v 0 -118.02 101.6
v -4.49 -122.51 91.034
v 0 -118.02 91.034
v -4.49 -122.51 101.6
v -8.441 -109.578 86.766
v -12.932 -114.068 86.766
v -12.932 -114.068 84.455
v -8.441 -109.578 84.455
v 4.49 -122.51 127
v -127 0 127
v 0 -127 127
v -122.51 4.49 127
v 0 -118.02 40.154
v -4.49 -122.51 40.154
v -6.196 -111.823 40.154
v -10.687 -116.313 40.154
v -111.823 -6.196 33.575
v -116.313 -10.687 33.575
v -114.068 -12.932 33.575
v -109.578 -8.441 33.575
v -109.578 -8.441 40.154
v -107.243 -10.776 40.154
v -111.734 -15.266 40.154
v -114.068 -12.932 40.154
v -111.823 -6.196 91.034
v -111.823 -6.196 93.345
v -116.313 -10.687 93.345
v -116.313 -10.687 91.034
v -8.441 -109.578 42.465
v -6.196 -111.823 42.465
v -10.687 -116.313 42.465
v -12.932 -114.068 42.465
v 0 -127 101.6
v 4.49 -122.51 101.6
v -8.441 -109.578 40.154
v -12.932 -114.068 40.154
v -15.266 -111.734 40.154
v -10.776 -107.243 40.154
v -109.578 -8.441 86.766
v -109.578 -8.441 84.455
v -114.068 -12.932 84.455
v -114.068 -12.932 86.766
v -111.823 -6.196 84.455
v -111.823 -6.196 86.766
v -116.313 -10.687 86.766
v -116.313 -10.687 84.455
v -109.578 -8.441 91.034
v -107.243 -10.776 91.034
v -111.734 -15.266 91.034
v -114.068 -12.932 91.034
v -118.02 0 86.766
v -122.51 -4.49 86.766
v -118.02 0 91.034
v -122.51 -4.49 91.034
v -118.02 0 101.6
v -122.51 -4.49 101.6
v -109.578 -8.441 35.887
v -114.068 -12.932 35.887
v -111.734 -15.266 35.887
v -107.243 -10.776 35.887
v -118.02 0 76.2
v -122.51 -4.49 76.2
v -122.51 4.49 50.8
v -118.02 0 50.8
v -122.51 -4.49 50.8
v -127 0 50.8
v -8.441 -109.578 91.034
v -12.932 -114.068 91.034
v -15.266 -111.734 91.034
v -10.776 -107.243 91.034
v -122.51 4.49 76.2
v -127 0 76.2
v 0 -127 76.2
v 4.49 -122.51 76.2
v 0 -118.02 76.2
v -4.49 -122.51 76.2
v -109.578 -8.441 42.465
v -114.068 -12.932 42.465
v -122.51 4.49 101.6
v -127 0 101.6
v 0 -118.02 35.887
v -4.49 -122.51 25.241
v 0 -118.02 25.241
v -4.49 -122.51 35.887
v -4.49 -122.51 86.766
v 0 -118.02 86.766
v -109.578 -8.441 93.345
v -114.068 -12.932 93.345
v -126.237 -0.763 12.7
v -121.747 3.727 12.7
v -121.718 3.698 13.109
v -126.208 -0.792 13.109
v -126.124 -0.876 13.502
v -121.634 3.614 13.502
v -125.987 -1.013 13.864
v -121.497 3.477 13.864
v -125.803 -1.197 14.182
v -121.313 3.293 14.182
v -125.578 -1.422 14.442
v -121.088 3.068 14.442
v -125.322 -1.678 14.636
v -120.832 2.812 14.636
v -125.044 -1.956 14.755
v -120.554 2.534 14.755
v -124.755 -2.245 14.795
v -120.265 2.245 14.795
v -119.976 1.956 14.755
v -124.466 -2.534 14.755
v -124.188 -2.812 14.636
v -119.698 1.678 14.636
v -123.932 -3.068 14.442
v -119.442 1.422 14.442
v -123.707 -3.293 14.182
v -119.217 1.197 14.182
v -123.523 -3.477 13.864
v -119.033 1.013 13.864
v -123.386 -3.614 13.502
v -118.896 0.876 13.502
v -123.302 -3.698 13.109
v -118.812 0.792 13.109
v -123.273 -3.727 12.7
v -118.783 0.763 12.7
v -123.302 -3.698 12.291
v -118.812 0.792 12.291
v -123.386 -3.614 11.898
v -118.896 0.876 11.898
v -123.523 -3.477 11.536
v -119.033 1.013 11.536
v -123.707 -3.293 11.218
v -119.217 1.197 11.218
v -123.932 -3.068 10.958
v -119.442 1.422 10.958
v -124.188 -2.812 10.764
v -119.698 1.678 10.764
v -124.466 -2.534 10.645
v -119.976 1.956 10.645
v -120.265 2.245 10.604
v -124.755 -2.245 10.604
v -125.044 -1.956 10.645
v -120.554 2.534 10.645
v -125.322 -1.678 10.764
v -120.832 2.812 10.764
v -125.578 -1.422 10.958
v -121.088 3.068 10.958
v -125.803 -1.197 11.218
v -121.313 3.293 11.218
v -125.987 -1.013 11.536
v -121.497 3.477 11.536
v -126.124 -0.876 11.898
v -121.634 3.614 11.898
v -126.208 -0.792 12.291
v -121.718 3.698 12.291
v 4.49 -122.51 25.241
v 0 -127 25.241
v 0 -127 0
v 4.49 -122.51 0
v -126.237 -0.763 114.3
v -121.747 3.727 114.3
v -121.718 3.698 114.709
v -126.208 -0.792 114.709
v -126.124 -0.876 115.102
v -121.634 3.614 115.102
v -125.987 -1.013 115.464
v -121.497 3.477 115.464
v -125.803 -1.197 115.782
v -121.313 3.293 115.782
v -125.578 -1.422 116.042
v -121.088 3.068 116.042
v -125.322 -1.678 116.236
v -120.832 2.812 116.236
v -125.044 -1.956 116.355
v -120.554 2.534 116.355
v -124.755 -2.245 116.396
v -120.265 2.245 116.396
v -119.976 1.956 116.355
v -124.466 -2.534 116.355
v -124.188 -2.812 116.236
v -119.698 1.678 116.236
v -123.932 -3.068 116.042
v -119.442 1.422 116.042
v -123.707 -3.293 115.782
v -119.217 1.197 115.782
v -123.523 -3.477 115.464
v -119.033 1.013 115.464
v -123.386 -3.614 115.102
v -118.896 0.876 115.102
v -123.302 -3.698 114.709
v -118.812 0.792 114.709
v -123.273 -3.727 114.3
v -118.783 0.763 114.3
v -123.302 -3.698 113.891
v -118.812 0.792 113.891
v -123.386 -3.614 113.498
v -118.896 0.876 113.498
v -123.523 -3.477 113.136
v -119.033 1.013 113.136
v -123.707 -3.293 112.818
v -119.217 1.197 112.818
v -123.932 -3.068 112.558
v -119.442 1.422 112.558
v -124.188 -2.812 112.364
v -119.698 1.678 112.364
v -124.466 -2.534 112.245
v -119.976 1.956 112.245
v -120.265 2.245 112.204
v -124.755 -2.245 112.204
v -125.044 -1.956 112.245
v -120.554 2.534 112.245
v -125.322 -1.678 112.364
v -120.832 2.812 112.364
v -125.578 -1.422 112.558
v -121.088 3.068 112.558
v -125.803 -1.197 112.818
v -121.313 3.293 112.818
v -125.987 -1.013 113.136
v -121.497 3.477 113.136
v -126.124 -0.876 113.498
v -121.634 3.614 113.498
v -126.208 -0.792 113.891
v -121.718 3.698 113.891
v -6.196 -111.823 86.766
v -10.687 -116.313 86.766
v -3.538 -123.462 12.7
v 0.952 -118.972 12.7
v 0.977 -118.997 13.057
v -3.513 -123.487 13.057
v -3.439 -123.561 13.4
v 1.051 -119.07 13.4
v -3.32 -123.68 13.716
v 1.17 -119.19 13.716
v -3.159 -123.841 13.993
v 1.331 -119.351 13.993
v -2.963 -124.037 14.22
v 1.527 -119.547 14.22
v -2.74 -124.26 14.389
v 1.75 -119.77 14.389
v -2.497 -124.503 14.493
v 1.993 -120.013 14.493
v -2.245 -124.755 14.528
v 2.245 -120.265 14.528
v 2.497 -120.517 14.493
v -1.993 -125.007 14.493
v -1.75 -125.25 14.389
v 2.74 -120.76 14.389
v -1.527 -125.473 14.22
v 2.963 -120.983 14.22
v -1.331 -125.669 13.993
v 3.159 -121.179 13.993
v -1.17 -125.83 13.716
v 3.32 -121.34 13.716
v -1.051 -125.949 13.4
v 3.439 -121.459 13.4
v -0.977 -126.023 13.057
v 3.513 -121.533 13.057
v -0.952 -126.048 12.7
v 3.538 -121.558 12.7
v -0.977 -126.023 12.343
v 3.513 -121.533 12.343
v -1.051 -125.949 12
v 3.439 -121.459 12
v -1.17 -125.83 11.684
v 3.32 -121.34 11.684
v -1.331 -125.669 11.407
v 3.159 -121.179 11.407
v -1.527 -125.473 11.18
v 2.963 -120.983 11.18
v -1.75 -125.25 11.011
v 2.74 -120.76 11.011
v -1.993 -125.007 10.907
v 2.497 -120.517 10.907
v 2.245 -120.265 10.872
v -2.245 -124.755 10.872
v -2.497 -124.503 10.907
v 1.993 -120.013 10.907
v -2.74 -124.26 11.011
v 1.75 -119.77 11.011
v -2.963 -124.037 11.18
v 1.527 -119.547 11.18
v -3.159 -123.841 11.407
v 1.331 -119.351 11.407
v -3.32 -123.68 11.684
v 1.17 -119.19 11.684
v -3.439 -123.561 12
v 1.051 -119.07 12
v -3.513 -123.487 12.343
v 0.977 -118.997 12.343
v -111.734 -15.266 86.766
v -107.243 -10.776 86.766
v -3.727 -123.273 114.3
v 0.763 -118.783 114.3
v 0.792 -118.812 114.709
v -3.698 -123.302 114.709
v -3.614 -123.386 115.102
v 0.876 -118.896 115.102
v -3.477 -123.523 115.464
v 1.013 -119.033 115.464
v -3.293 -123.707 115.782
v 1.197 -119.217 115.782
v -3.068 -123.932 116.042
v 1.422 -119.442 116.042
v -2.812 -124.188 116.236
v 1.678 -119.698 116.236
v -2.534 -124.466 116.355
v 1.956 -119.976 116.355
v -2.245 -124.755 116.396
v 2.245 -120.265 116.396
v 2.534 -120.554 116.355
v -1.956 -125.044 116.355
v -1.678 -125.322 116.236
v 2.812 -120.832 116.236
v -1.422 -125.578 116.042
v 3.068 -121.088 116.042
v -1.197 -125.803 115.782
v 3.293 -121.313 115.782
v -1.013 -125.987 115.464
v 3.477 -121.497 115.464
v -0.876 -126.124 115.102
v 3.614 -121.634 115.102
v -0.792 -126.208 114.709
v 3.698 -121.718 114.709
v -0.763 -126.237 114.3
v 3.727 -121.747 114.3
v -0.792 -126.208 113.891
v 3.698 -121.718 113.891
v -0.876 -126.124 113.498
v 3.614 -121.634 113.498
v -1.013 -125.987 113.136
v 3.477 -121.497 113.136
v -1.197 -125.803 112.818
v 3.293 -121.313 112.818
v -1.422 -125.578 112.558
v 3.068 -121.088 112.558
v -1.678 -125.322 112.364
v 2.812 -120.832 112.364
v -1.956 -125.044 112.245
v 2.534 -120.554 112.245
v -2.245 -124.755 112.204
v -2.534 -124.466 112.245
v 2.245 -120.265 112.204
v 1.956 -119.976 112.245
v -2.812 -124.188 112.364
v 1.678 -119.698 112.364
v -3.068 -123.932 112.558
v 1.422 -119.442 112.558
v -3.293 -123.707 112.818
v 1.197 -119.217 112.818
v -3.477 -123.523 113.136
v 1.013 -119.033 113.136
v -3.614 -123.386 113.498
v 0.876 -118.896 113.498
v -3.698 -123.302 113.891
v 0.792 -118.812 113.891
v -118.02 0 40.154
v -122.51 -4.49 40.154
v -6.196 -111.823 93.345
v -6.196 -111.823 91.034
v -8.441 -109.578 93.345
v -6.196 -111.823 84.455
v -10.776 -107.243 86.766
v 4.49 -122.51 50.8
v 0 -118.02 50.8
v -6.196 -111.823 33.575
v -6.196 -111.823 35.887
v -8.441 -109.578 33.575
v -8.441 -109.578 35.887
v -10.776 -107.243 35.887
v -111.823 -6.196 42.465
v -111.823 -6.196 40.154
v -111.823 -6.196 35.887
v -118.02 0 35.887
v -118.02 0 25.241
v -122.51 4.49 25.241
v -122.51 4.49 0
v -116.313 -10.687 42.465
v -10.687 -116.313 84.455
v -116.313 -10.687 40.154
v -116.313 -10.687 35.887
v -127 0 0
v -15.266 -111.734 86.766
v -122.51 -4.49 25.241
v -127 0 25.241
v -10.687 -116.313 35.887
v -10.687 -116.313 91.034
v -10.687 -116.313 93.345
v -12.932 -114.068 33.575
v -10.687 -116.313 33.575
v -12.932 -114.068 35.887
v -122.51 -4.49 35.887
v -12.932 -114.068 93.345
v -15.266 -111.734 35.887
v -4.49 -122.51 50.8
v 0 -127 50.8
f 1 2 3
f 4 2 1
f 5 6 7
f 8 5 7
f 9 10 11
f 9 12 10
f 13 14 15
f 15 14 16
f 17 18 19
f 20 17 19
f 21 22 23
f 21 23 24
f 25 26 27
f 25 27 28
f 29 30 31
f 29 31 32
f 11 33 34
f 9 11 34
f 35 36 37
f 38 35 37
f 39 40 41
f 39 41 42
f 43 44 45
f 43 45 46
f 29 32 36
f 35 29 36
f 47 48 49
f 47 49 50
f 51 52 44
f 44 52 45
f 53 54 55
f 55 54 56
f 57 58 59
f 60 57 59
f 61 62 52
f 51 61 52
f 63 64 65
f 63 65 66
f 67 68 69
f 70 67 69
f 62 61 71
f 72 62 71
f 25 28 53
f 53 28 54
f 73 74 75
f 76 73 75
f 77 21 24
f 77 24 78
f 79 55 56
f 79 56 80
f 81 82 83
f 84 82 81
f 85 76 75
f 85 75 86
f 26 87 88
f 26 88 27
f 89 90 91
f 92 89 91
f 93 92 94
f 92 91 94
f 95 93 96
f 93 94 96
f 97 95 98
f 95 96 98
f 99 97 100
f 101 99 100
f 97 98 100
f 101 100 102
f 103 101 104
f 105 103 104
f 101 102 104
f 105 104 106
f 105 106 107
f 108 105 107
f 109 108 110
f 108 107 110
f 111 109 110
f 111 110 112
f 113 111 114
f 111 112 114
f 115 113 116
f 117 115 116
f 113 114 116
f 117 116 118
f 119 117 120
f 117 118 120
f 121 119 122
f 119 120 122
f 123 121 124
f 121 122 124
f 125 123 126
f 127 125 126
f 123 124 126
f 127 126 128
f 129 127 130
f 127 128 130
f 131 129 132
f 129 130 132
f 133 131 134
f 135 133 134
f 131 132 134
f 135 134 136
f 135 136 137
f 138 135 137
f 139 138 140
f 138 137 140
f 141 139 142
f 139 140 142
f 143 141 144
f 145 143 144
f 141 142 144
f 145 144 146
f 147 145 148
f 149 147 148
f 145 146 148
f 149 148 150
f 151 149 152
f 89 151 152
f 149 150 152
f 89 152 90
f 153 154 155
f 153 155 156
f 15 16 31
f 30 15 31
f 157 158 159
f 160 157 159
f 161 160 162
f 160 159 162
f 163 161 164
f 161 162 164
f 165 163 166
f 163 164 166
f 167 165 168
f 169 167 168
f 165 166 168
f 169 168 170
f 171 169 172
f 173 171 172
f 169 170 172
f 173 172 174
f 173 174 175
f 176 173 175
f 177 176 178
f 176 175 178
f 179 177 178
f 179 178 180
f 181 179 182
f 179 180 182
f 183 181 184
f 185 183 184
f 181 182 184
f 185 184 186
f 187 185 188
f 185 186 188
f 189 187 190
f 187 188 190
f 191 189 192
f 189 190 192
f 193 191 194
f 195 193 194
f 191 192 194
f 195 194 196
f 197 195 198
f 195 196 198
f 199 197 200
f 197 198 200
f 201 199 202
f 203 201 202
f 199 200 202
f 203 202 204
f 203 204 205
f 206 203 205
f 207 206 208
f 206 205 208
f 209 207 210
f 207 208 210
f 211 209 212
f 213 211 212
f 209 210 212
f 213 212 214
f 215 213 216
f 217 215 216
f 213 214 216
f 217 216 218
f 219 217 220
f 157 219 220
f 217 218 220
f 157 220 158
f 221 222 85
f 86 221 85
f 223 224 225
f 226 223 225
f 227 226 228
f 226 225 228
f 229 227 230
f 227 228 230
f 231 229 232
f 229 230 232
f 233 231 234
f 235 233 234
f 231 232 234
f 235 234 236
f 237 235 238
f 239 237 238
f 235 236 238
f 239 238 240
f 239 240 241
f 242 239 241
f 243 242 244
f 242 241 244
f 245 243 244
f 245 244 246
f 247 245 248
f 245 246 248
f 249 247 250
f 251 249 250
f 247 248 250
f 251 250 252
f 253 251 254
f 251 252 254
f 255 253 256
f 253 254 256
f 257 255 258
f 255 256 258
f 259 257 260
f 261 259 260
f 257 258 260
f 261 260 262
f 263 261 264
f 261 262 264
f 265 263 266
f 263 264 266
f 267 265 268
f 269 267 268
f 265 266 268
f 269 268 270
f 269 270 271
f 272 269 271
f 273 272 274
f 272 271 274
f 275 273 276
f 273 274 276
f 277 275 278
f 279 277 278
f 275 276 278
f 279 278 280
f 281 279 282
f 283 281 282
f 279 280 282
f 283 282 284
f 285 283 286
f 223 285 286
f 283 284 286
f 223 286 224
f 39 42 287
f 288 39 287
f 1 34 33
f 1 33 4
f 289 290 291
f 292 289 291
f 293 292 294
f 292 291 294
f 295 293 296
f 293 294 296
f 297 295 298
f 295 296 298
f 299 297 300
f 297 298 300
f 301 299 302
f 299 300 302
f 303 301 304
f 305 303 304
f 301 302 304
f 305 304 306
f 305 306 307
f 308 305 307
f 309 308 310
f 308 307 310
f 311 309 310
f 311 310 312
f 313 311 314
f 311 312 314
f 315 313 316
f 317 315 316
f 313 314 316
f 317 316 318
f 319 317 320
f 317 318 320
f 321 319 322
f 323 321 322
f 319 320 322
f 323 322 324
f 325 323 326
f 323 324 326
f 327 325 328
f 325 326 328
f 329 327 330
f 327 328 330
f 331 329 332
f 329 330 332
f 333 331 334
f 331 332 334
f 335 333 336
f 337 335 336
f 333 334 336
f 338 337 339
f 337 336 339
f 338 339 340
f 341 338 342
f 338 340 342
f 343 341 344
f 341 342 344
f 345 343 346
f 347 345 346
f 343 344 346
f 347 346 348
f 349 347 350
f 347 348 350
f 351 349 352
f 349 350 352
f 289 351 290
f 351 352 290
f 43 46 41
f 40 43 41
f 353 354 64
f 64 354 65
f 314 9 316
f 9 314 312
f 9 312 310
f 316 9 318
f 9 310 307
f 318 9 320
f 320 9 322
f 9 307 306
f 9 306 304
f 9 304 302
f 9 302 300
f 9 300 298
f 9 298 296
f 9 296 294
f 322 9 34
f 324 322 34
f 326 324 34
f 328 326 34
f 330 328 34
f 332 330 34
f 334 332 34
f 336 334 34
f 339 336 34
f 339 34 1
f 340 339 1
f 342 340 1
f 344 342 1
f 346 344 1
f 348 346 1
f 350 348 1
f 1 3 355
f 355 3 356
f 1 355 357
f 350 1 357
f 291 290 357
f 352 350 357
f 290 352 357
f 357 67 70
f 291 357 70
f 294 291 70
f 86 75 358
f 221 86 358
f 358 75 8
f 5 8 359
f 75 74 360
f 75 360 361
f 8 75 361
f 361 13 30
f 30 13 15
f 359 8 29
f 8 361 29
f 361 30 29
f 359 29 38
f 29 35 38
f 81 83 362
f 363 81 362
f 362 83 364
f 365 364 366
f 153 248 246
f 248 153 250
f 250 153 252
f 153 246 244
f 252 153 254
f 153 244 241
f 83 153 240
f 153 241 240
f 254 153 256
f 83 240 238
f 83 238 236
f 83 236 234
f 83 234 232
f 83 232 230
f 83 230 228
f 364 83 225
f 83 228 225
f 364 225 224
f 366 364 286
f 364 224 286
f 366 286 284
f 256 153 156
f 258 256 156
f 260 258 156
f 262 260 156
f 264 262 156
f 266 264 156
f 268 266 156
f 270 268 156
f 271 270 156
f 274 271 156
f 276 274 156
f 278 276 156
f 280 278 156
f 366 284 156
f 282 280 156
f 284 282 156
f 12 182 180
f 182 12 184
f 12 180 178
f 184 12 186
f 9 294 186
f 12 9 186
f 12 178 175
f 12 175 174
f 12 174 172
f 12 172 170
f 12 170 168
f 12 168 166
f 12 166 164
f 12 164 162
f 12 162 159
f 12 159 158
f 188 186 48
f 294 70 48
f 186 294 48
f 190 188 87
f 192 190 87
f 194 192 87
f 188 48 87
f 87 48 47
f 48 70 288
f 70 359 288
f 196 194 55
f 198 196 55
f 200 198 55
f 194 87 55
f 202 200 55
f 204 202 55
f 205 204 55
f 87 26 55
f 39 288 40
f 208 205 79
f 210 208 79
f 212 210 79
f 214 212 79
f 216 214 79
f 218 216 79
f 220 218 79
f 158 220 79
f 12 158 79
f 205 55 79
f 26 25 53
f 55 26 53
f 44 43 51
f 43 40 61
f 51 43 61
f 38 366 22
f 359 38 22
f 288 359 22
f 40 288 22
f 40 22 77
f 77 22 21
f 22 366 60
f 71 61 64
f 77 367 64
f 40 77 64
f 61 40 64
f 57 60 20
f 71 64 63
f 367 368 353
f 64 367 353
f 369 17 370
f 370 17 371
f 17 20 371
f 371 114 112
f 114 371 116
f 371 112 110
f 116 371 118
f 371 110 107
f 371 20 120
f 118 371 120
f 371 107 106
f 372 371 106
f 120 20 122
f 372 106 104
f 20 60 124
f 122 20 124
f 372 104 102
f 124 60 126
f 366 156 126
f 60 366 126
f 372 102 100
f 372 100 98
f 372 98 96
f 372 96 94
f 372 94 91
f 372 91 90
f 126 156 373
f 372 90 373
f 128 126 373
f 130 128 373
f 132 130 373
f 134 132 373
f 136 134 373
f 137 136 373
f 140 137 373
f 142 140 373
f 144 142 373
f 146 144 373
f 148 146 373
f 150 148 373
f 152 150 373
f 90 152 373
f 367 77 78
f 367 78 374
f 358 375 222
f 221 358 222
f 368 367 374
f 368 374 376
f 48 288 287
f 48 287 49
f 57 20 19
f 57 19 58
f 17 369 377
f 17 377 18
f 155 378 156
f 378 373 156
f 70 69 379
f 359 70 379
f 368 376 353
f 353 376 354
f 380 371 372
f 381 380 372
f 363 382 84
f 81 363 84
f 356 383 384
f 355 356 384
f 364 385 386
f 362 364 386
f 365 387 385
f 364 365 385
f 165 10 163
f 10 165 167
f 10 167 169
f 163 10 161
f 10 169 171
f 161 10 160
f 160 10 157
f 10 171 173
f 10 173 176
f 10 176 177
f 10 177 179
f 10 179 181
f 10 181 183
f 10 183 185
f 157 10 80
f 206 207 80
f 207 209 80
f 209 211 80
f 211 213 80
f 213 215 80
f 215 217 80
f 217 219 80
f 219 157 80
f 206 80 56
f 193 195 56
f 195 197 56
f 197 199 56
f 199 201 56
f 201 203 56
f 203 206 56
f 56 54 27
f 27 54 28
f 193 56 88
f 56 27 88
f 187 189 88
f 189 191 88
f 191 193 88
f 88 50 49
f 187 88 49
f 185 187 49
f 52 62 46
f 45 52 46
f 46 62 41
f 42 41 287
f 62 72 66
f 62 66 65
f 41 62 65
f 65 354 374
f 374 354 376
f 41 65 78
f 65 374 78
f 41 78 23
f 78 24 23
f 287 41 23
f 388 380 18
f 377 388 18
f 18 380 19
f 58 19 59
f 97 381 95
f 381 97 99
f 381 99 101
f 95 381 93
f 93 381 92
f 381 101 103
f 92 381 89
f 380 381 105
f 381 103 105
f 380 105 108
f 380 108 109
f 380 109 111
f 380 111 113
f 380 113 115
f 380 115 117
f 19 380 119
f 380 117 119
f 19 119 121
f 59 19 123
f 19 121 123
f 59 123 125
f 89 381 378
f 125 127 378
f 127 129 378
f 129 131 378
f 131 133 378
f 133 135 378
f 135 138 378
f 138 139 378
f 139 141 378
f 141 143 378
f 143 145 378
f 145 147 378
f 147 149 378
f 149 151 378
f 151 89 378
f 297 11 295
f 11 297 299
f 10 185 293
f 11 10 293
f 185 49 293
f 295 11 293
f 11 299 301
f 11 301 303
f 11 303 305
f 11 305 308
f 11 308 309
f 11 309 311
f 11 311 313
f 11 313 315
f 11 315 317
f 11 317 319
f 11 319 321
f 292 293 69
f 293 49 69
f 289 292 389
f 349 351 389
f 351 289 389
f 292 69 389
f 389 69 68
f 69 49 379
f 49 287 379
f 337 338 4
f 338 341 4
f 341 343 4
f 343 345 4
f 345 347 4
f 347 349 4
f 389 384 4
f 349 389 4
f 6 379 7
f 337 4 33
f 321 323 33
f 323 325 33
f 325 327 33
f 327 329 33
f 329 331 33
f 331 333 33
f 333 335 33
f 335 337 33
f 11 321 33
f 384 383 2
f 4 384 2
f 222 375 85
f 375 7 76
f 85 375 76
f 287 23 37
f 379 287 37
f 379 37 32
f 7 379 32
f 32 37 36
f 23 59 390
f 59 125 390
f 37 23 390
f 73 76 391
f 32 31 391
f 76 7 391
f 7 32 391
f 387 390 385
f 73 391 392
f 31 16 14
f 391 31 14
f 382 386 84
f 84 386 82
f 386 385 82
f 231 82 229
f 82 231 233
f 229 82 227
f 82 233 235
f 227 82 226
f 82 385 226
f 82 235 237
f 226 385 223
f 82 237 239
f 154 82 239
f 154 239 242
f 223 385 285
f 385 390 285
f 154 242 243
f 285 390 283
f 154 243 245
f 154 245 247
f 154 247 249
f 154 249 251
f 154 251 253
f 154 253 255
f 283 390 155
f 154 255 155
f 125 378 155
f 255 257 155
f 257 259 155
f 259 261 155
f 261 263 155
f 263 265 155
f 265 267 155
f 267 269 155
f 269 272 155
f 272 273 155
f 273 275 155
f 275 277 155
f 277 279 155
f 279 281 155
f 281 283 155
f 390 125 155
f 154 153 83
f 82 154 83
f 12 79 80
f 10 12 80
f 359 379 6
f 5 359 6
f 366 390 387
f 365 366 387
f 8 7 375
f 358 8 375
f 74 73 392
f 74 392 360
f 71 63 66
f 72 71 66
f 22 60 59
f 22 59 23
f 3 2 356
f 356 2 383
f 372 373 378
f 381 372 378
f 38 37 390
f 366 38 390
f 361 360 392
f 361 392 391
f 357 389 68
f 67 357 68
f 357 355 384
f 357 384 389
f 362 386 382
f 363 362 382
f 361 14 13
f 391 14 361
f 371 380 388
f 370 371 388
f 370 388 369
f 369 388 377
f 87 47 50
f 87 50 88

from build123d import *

# Parameters (mm, degrees)
BOSS_EXTRUDE1_DEPTH = 127
SKETCH2_W           = 25.4
SKETCH2_H           = 6.35
SKETCH2_W_2         = 25.559422118
CUT_EXTRUDE1_DEPTH  = 6.35
CUT_EXTRUDE2_DEPTH  = 6.35
SKETCH4_R           = 2.0955
SKETCH4_R_2         = 1.828321723
CUT_EXTRUDE3_DEPTH  = 6.35


with BuildPart() as part:
    # Sketch1 → Boss-Extrude1 (new body)
    with BuildSketch(Plane.XY):
        Polygon((-127, 0), (0, -127), (4.490128061, -122.509871939), (-122.509871939, 4.490128061), align=None)
    extrude(amount=BOSS_EXTRUDE1_DEPTH)

    # Sketch2 → Cut-Extrude1 (cut)
    with BuildSketch(Plane(origin=(-63.5, -63.5, 0), x_dir=(0, 0, 1), z_dir=(-0.7071067811865509, -0.7071067811865441, 0))):
        with Locations((88.9, 86.627561211)):
            Rectangle(SKETCH2_W, SKETCH2_H)
        with Locations((38.020288941, 86.627561211)):
            Rectangle(SKETCH2_W_2, SKETCH2_H)
        with Locations((88.9, -86.627561211)):
            Rectangle(SKETCH2_W, SKETCH2_H)
        with Locations((38.020288941, -86.627561211)):
            Rectangle(SKETCH2_W_2, SKETCH2_H)
    extrude(amount=-CUT_EXTRUDE1_DEPTH, mode=Mode.SUBTRACT)

    # Sketch3 → Cut-Extrude2 (cut)
    with BuildSketch(Plane(origin=(-63.5, -63.5, 0), x_dir=(0, 0, 1), z_dir=(-0.7071067811865509, -0.7071067811865441, 0))):
        Polygon((91.0336, 83.452561211), (86.7664, 83.452561211), (86.7664, 74.689561211), (84.455, 74.689561211), (84.455, 71.514561211), (86.7664, 71.514561211), (86.7664, 68.212561211), (91.0336, 68.212561211), (91.0336, 71.514561211), (93.345, 71.514561211), (93.345, 74.689561211), (91.0336, 74.689561211), align=None)
        Polygon((40.153888941, 83.452561211), (35.886688941, 83.452561211), (35.886688941, 74.689561211), (33.575288941, 74.689561211), (33.575288941, 71.514561211), (35.886688941, 71.514561211), (35.886688941, 68.212561211), (40.153888941, 68.212561211), (40.153888941, 71.514561211), (42.465288941, 71.514561211), (42.465288941, 74.689561211), (40.153888941, 74.689561211), align=None)
        Polygon((86.7664, -83.452561211), (91.0336, -83.452561211), (91.0336, -74.689561211), (93.345, -74.689561211), (93.345, -71.514561211), (91.0336, -71.514561211), (91.0336, -68.212561211), (86.7664, -68.212561211), (86.7664, -71.514561211), (84.455, -71.514561211), (84.455, -74.689561211), (86.7664, -74.689561211), align=None)
        Polygon((35.886688941, -83.452561211), (40.153888941, -83.452561211), (40.153888941, -74.689561211), (42.465288941, -74.689561211), (42.465288941, -71.514561211), (40.153888941, -71.514561211), (40.153888941, -68.212561211), (35.886688941, -68.212561211), (35.886688941, -71.514561211), (33.575288941, -71.514561211), (33.575288941, -74.689561211), (35.886688941, -74.689561211), align=None)
    extrude(amount=-CUT_EXTRUDE2_DEPTH, mode=Mode.SUBTRACT)

    # Sketch4 → Cut-Extrude3 (cut)
    with BuildSketch(Plane(origin=(-59.009871939, -59.009871939, 0), x_dir=(0, 0, -1), z_dir=(0.707106781186551, 0.7071067811865441, 0))):
        with Locations(Location((-114.3, 86.627561211, 0), (0, 0, 90))):
            Circle(SKETCH4_R)
        with Locations(Location((-12.7, 86.627561211, 0), (0, 0, 90))):
            Circle(SKETCH4_R)
        with Locations(Location((-12.7, -86.627561211, 0), (0, 0, 90))):
            Circle(SKETCH4_R_2)
        with Locations(Location((-114.3, -86.627561211, 0), (0, 0, 90))):
            Circle(SKETCH4_R)
    extrude(amount=-CUT_EXTRUDE3_DEPTH, mode=Mode.SUBTRACT)


solid = part.part
